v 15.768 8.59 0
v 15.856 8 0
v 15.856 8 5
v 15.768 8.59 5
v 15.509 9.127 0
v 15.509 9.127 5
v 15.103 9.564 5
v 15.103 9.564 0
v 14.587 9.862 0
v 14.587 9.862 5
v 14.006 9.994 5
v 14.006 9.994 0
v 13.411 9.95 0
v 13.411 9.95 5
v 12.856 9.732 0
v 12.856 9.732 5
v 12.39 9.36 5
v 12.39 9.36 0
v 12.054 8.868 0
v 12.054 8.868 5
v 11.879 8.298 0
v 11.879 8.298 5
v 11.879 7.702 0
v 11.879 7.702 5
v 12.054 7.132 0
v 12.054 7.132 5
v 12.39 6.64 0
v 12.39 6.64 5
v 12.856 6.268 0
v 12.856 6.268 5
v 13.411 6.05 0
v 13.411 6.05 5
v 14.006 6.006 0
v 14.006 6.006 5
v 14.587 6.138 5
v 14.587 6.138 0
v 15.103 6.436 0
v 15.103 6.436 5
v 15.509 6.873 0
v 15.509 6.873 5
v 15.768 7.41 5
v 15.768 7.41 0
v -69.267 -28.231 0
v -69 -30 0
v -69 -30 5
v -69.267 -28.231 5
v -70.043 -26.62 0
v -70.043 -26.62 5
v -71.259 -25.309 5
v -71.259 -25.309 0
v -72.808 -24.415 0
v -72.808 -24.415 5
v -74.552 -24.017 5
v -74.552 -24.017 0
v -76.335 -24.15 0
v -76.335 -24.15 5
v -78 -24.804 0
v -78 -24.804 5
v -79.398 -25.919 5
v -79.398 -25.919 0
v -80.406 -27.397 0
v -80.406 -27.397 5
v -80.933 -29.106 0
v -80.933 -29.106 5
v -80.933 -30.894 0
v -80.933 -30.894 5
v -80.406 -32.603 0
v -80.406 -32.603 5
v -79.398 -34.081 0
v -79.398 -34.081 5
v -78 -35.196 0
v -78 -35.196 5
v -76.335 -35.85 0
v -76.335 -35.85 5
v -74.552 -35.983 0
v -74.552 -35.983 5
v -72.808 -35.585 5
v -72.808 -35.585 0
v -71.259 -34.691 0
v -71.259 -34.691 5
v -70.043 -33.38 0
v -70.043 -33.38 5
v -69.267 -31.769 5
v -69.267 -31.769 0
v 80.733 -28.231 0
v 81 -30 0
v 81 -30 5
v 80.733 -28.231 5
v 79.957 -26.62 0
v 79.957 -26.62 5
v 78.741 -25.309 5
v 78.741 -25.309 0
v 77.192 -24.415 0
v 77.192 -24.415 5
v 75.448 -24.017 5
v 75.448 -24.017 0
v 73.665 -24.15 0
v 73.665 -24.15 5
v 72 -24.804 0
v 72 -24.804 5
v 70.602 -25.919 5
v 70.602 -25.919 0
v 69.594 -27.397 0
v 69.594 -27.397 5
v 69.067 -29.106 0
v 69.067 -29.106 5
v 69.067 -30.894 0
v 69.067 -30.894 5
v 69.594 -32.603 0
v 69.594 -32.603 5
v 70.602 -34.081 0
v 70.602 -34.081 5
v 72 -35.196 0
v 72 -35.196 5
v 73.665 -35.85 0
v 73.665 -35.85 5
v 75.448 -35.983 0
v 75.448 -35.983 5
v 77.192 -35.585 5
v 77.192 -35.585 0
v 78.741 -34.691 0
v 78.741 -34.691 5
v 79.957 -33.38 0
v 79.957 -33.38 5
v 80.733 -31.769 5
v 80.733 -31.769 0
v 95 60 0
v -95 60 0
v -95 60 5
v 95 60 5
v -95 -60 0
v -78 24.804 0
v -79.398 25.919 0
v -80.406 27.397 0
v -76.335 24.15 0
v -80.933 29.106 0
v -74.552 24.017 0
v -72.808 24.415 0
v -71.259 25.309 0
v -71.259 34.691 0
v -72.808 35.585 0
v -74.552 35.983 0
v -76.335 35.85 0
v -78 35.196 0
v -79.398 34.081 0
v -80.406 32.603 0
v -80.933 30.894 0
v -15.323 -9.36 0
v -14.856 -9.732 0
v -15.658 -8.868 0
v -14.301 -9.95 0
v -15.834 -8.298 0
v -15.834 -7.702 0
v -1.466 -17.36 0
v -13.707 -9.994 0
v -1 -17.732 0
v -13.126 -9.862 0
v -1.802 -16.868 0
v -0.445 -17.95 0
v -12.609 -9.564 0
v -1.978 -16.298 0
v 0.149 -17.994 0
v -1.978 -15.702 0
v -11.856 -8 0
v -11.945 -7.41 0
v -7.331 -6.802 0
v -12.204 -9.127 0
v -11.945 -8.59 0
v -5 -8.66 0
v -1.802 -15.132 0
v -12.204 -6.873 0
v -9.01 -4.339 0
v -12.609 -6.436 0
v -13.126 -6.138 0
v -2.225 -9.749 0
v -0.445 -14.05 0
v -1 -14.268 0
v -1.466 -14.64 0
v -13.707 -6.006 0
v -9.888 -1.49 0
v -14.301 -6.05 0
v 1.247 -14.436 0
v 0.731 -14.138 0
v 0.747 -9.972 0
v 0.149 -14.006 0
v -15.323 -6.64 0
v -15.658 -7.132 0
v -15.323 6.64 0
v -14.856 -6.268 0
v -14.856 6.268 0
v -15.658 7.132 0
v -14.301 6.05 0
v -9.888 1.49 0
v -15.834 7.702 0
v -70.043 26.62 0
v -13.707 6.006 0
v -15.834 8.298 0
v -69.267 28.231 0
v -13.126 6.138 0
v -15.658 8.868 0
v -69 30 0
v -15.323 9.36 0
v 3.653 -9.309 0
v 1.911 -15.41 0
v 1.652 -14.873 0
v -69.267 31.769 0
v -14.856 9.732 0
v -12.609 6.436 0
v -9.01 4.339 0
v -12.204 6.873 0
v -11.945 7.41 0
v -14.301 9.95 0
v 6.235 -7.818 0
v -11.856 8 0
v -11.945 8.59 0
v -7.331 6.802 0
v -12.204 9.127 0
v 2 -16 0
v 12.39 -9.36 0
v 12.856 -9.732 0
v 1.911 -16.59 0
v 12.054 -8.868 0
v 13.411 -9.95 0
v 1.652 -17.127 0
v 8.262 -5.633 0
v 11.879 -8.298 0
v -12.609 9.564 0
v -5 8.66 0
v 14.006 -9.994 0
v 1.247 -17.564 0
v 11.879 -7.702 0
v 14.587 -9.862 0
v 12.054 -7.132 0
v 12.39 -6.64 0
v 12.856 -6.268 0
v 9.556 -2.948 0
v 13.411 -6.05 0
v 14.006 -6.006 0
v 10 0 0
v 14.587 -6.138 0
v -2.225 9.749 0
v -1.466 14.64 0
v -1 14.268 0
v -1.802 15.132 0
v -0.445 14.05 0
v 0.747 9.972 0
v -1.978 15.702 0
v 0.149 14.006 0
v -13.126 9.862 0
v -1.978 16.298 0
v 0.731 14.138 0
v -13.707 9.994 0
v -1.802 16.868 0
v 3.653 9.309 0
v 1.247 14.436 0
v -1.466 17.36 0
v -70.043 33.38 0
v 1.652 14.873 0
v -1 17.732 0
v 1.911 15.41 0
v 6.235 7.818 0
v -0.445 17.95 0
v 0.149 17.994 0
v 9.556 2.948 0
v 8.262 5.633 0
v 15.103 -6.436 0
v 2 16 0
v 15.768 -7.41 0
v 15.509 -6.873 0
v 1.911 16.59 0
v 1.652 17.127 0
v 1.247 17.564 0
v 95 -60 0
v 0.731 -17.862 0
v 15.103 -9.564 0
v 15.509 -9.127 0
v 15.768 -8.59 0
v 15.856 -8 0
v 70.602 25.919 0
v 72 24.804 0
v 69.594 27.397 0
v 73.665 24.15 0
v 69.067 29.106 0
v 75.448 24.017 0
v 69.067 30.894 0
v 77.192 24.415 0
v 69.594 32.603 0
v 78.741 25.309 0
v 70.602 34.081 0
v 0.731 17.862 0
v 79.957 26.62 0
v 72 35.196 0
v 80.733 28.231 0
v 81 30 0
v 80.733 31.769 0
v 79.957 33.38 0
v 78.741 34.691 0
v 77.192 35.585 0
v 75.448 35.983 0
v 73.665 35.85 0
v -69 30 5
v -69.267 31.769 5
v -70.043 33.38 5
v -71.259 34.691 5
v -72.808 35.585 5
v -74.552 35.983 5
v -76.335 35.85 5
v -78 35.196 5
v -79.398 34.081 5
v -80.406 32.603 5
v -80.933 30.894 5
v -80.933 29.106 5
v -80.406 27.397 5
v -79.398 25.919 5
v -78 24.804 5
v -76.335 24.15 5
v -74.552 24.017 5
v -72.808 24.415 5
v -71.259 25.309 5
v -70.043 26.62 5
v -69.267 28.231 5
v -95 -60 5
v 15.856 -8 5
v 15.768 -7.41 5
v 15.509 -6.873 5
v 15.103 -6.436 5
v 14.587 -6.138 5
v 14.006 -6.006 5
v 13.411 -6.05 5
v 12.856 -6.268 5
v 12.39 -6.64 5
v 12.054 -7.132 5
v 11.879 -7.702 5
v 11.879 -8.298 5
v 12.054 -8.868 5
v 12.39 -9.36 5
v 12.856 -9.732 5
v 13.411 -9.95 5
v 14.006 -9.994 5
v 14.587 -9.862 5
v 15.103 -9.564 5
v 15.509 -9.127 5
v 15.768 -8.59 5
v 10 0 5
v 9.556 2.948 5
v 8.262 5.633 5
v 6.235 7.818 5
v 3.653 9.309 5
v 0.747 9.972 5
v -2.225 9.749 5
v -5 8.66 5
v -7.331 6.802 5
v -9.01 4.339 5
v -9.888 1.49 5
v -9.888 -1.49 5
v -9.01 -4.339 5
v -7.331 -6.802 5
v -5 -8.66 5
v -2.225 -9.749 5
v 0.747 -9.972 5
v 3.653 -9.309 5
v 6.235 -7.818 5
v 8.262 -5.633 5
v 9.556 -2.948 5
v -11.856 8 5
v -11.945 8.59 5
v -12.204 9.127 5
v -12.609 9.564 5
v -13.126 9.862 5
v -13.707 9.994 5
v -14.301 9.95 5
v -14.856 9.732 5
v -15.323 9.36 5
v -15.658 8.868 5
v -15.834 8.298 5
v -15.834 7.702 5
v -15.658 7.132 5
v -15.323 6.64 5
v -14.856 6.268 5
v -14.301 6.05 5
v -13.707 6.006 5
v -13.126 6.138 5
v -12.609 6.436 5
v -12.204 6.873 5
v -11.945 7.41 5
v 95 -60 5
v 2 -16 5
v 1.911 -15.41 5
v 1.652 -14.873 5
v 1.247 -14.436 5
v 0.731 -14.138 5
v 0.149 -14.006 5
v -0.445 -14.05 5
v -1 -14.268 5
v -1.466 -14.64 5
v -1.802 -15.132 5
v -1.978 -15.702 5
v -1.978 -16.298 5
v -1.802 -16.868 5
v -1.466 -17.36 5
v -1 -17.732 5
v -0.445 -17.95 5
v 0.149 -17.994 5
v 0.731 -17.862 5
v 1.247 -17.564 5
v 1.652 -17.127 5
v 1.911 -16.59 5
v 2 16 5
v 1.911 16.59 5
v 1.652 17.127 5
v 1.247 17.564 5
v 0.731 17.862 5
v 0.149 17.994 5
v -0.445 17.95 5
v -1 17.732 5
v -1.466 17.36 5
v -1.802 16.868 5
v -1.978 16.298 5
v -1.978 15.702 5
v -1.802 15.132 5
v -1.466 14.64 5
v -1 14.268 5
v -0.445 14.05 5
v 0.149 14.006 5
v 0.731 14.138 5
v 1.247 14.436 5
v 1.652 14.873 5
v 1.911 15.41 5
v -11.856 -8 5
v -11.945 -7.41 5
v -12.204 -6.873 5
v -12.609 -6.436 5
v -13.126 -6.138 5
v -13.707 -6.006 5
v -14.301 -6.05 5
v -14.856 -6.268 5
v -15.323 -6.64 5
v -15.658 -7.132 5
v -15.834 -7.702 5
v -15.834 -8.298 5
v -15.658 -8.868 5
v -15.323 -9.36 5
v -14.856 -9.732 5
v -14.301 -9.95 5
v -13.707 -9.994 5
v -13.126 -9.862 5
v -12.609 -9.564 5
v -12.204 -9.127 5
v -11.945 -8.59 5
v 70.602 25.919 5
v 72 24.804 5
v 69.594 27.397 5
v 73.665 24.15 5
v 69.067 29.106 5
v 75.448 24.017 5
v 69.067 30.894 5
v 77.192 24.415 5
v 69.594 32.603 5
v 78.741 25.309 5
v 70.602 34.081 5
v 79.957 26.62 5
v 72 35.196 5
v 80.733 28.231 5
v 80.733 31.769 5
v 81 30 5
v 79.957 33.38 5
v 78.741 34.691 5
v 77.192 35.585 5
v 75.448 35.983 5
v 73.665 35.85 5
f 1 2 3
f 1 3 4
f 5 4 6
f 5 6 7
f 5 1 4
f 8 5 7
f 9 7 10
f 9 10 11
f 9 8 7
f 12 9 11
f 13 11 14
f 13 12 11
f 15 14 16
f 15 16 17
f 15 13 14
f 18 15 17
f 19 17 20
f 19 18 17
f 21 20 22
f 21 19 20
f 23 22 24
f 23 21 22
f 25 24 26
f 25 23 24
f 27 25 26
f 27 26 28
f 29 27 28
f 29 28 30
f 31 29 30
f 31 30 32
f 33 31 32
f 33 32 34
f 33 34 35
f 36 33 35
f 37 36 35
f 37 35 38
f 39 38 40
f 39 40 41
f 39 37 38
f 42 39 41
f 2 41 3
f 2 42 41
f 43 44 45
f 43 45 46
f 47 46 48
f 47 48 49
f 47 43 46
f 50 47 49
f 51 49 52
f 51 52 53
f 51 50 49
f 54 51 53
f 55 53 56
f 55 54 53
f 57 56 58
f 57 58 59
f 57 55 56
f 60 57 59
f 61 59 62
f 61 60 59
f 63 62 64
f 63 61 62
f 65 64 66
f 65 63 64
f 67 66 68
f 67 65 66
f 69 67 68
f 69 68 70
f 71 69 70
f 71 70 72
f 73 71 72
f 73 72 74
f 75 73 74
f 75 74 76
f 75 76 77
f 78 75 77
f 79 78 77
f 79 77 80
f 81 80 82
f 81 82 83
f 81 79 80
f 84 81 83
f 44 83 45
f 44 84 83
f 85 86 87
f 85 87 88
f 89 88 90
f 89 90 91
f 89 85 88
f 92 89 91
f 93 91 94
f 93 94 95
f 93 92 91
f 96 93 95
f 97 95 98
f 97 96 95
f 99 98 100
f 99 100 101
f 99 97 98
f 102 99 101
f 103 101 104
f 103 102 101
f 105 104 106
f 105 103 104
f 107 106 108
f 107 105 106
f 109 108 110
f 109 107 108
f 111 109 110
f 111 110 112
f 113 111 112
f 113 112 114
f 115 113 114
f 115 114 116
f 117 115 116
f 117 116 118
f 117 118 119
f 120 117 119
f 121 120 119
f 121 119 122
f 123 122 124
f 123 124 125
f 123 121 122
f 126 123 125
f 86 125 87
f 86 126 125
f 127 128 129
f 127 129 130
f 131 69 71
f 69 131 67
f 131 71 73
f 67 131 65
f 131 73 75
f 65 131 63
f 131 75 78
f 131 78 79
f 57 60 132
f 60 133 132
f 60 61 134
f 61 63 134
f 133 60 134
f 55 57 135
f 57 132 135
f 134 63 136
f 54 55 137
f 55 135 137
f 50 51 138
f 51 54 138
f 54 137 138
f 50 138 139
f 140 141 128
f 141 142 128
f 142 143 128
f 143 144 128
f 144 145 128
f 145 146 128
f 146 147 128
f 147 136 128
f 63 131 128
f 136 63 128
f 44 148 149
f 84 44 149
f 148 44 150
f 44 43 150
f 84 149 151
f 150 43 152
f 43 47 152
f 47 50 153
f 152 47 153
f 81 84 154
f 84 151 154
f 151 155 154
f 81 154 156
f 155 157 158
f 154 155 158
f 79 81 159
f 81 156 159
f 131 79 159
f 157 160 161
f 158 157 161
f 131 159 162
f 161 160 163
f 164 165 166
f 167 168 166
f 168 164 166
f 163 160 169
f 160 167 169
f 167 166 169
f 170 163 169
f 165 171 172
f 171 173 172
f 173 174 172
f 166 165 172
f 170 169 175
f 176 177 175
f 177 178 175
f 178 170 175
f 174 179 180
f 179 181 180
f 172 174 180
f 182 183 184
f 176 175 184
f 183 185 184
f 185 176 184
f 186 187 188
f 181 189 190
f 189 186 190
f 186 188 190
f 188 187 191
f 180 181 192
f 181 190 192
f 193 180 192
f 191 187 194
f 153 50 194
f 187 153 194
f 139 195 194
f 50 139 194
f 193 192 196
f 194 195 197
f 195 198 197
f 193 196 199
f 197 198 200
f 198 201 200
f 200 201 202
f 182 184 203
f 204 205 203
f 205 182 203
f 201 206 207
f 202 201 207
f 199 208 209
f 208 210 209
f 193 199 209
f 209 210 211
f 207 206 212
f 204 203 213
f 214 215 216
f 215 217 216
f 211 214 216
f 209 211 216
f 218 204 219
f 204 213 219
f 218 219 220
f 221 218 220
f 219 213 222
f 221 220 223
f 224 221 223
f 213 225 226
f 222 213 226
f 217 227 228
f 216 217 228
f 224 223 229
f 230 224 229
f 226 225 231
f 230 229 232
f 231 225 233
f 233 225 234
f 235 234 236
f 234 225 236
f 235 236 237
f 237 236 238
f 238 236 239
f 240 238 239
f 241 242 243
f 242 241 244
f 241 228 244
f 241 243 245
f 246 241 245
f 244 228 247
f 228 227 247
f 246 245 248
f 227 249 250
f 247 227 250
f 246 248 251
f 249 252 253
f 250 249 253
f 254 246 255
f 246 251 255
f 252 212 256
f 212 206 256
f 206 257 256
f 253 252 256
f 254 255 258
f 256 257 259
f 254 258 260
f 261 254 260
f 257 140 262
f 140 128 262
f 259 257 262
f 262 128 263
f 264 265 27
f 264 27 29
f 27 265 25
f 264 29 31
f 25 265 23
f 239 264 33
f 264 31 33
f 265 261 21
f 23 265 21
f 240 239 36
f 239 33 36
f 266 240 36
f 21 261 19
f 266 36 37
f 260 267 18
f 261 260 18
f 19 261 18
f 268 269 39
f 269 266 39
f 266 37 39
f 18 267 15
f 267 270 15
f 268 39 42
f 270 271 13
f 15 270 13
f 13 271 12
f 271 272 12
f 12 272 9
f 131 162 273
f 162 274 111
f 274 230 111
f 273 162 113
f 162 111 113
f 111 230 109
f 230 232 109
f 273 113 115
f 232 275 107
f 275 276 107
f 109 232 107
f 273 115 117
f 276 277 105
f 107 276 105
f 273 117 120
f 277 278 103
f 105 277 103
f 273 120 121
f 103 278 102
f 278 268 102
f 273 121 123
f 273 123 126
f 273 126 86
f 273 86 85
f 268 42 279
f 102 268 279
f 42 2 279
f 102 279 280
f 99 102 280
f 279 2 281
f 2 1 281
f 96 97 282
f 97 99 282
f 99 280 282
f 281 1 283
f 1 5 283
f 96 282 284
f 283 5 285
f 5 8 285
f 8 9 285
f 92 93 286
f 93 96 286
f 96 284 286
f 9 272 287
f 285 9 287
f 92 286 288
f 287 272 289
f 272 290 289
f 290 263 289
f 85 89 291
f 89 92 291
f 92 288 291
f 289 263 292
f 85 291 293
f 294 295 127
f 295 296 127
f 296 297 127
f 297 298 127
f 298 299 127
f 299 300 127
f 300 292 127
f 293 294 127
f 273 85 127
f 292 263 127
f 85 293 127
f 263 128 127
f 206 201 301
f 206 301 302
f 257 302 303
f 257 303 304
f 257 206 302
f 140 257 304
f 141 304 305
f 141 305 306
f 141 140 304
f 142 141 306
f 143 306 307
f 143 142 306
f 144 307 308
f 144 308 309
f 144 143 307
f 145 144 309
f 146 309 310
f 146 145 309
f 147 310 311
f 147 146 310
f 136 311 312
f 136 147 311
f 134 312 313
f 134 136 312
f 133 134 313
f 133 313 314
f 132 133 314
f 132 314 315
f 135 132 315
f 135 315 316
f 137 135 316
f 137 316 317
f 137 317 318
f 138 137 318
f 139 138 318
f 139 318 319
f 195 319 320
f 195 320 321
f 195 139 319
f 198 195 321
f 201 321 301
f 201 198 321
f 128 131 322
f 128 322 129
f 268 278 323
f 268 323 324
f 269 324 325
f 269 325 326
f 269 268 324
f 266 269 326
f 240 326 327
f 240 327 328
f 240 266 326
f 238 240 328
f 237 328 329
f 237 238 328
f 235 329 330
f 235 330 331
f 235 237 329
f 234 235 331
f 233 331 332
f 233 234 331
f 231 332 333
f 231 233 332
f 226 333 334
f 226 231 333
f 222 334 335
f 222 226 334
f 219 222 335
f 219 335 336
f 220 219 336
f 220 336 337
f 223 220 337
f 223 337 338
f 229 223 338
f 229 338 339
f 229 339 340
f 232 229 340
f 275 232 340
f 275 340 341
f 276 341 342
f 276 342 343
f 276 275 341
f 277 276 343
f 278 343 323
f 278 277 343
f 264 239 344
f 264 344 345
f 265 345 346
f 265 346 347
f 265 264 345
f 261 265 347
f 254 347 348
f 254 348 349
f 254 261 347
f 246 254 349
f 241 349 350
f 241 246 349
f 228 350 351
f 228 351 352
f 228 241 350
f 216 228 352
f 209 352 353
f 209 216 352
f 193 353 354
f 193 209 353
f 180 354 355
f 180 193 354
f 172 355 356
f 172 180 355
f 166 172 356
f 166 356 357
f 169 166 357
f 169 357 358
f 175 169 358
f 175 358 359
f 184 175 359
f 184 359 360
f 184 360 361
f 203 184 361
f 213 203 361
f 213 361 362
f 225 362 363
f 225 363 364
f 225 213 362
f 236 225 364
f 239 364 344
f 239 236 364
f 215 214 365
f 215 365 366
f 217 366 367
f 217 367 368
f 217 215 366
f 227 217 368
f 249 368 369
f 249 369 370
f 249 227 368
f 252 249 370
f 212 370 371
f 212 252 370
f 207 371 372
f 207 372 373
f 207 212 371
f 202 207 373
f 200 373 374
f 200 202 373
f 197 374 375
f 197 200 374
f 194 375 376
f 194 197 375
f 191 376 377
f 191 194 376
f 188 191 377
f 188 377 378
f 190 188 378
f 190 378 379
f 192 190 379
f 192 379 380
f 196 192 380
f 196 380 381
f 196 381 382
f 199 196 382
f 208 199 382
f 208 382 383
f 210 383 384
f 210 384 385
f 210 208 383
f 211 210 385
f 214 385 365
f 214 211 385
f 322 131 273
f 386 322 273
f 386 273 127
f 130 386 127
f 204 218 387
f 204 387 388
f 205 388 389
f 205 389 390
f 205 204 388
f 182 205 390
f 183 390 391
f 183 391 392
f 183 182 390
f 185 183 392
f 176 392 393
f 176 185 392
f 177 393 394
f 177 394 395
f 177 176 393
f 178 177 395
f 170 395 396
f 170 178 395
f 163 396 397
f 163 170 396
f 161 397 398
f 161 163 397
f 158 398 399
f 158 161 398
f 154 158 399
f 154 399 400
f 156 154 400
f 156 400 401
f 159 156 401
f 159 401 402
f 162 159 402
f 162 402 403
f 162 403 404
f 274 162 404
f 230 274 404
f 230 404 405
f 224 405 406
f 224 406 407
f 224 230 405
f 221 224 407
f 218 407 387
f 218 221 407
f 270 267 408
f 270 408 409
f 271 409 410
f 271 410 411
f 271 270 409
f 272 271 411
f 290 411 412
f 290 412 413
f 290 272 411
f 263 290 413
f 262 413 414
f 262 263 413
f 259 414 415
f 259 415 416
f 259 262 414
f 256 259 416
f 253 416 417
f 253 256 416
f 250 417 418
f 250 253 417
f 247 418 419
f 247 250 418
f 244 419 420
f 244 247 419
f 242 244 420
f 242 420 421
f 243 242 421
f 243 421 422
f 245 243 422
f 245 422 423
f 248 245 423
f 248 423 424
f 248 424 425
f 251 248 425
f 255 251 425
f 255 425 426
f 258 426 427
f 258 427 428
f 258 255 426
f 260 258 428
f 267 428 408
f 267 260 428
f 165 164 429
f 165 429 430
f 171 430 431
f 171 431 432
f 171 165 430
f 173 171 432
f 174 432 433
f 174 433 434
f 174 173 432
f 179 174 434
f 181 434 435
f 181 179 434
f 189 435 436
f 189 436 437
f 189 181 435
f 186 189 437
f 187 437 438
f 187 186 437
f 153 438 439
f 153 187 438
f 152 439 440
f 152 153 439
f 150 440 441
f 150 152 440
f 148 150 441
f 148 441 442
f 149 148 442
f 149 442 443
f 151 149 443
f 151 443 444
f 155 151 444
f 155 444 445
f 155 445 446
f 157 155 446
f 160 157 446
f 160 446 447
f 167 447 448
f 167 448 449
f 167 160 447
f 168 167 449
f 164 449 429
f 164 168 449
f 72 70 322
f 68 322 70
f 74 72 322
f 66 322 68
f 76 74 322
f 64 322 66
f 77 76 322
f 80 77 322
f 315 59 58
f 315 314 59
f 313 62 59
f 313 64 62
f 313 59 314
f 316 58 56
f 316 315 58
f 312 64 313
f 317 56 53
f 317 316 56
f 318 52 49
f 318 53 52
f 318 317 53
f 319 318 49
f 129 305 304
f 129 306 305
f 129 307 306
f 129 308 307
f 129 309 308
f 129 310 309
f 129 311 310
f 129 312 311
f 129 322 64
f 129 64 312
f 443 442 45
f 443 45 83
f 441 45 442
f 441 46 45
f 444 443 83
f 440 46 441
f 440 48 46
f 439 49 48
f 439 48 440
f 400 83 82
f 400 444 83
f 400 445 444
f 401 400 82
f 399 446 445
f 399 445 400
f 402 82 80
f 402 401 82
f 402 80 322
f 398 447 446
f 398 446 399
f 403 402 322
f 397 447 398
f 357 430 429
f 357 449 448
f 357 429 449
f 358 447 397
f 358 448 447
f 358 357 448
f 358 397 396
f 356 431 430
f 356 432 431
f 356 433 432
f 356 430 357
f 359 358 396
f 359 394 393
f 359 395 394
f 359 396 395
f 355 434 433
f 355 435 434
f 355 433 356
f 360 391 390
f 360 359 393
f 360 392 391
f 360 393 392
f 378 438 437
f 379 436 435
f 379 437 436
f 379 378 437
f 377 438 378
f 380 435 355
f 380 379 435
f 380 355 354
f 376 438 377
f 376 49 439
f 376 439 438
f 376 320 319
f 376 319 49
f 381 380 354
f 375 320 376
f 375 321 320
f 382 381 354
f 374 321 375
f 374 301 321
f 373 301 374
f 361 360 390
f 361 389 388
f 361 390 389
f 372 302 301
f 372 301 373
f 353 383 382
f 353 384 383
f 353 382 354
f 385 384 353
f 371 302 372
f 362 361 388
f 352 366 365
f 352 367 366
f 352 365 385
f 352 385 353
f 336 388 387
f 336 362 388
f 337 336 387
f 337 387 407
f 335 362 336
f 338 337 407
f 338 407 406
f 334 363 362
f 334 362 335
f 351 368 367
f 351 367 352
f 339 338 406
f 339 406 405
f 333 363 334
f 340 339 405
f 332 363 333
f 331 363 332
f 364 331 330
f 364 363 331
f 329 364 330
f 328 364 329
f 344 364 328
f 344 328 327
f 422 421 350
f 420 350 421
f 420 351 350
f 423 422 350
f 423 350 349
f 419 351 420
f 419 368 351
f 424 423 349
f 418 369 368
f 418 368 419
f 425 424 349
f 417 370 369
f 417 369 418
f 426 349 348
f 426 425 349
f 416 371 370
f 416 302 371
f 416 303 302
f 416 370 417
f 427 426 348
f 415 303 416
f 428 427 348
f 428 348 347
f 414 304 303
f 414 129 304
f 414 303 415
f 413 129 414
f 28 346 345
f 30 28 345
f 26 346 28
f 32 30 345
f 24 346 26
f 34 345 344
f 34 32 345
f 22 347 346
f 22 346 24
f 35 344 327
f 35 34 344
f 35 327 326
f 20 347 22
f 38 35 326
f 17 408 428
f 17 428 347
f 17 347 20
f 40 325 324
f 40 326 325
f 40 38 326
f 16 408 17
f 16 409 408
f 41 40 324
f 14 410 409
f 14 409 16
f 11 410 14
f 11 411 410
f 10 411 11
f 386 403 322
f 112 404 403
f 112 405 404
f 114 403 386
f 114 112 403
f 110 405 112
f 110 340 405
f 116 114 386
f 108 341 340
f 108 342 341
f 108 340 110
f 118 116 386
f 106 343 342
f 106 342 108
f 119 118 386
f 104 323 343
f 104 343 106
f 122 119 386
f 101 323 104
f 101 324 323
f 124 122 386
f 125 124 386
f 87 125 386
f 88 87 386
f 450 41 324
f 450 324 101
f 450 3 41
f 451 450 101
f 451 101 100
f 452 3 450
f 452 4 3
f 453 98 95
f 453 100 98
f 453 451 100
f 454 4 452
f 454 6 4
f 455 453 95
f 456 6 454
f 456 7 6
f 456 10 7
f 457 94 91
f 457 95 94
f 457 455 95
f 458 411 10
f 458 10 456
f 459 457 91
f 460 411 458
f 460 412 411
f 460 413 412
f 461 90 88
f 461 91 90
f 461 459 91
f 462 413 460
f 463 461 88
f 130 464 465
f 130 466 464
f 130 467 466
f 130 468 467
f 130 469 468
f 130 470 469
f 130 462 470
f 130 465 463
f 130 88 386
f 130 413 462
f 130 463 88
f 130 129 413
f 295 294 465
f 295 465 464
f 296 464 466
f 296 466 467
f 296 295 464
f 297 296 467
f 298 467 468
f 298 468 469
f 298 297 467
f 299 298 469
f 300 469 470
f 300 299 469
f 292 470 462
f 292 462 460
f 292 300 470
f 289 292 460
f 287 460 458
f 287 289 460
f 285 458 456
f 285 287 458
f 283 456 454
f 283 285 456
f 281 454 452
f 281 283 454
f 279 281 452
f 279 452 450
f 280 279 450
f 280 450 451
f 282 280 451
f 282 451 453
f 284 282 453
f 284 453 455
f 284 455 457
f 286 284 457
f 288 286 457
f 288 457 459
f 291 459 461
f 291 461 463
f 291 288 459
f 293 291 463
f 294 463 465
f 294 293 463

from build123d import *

# Parameters (mm, degrees)
SKETCH1_W           = 190
SKETCH1_H           = 120
SKETCH1_R           = 6
SKETCH1_R_2         = 10
SKETCH1_R_3         = 2
BOSS_EXTRUDE1_DEPTH = 5


with BuildPart() as part:
    # Sketch1 → Boss-Extrude1 (new body)
    with BuildSketch(Plane.XY):
        Rectangle(SKETCH1_W, SKETCH1_H)
        with Locations((-75, 30)):
            Circle(SKETCH1_R, mode=Mode.SUBTRACT)
        with Locations((75, 30)):
            Circle(SKETCH1_R, mode=Mode.SUBTRACT)
        with Locations((75, -30)):
            Circle(SKETCH1_R, mode=Mode.SUBTRACT)
        with Locations((-75, -30)):
            Circle(SKETCH1_R, mode=Mode.SUBTRACT)
        Circle(SKETCH1_R_2, mode=Mode.SUBTRACT)
        with Locations((0, 16)):
            Circle(SKETCH1_R_3, mode=Mode.SUBTRACT)
        with Locations((13.856406461, 8)):
            Circle(SKETCH1_R_3, mode=Mode.SUBTRACT)
        with Locations((13.856406461, -8)):
            Circle(SKETCH1_R_3, mode=Mode.SUBTRACT)
        with Locations((0, -16)):
            Circle(SKETCH1_R_3, mode=Mode.SUBTRACT)
        with Locations((-13.856406461, -8)):
            Circle(SKETCH1_R_3, mode=Mode.SUBTRACT)
        with Locations((-13.856406461, 8)):
            Circle(SKETCH1_R_3, mode=Mode.SUBTRACT)
    extrude(amount=BOSS_EXTRUDE1_DEPTH)


solid = part.part
